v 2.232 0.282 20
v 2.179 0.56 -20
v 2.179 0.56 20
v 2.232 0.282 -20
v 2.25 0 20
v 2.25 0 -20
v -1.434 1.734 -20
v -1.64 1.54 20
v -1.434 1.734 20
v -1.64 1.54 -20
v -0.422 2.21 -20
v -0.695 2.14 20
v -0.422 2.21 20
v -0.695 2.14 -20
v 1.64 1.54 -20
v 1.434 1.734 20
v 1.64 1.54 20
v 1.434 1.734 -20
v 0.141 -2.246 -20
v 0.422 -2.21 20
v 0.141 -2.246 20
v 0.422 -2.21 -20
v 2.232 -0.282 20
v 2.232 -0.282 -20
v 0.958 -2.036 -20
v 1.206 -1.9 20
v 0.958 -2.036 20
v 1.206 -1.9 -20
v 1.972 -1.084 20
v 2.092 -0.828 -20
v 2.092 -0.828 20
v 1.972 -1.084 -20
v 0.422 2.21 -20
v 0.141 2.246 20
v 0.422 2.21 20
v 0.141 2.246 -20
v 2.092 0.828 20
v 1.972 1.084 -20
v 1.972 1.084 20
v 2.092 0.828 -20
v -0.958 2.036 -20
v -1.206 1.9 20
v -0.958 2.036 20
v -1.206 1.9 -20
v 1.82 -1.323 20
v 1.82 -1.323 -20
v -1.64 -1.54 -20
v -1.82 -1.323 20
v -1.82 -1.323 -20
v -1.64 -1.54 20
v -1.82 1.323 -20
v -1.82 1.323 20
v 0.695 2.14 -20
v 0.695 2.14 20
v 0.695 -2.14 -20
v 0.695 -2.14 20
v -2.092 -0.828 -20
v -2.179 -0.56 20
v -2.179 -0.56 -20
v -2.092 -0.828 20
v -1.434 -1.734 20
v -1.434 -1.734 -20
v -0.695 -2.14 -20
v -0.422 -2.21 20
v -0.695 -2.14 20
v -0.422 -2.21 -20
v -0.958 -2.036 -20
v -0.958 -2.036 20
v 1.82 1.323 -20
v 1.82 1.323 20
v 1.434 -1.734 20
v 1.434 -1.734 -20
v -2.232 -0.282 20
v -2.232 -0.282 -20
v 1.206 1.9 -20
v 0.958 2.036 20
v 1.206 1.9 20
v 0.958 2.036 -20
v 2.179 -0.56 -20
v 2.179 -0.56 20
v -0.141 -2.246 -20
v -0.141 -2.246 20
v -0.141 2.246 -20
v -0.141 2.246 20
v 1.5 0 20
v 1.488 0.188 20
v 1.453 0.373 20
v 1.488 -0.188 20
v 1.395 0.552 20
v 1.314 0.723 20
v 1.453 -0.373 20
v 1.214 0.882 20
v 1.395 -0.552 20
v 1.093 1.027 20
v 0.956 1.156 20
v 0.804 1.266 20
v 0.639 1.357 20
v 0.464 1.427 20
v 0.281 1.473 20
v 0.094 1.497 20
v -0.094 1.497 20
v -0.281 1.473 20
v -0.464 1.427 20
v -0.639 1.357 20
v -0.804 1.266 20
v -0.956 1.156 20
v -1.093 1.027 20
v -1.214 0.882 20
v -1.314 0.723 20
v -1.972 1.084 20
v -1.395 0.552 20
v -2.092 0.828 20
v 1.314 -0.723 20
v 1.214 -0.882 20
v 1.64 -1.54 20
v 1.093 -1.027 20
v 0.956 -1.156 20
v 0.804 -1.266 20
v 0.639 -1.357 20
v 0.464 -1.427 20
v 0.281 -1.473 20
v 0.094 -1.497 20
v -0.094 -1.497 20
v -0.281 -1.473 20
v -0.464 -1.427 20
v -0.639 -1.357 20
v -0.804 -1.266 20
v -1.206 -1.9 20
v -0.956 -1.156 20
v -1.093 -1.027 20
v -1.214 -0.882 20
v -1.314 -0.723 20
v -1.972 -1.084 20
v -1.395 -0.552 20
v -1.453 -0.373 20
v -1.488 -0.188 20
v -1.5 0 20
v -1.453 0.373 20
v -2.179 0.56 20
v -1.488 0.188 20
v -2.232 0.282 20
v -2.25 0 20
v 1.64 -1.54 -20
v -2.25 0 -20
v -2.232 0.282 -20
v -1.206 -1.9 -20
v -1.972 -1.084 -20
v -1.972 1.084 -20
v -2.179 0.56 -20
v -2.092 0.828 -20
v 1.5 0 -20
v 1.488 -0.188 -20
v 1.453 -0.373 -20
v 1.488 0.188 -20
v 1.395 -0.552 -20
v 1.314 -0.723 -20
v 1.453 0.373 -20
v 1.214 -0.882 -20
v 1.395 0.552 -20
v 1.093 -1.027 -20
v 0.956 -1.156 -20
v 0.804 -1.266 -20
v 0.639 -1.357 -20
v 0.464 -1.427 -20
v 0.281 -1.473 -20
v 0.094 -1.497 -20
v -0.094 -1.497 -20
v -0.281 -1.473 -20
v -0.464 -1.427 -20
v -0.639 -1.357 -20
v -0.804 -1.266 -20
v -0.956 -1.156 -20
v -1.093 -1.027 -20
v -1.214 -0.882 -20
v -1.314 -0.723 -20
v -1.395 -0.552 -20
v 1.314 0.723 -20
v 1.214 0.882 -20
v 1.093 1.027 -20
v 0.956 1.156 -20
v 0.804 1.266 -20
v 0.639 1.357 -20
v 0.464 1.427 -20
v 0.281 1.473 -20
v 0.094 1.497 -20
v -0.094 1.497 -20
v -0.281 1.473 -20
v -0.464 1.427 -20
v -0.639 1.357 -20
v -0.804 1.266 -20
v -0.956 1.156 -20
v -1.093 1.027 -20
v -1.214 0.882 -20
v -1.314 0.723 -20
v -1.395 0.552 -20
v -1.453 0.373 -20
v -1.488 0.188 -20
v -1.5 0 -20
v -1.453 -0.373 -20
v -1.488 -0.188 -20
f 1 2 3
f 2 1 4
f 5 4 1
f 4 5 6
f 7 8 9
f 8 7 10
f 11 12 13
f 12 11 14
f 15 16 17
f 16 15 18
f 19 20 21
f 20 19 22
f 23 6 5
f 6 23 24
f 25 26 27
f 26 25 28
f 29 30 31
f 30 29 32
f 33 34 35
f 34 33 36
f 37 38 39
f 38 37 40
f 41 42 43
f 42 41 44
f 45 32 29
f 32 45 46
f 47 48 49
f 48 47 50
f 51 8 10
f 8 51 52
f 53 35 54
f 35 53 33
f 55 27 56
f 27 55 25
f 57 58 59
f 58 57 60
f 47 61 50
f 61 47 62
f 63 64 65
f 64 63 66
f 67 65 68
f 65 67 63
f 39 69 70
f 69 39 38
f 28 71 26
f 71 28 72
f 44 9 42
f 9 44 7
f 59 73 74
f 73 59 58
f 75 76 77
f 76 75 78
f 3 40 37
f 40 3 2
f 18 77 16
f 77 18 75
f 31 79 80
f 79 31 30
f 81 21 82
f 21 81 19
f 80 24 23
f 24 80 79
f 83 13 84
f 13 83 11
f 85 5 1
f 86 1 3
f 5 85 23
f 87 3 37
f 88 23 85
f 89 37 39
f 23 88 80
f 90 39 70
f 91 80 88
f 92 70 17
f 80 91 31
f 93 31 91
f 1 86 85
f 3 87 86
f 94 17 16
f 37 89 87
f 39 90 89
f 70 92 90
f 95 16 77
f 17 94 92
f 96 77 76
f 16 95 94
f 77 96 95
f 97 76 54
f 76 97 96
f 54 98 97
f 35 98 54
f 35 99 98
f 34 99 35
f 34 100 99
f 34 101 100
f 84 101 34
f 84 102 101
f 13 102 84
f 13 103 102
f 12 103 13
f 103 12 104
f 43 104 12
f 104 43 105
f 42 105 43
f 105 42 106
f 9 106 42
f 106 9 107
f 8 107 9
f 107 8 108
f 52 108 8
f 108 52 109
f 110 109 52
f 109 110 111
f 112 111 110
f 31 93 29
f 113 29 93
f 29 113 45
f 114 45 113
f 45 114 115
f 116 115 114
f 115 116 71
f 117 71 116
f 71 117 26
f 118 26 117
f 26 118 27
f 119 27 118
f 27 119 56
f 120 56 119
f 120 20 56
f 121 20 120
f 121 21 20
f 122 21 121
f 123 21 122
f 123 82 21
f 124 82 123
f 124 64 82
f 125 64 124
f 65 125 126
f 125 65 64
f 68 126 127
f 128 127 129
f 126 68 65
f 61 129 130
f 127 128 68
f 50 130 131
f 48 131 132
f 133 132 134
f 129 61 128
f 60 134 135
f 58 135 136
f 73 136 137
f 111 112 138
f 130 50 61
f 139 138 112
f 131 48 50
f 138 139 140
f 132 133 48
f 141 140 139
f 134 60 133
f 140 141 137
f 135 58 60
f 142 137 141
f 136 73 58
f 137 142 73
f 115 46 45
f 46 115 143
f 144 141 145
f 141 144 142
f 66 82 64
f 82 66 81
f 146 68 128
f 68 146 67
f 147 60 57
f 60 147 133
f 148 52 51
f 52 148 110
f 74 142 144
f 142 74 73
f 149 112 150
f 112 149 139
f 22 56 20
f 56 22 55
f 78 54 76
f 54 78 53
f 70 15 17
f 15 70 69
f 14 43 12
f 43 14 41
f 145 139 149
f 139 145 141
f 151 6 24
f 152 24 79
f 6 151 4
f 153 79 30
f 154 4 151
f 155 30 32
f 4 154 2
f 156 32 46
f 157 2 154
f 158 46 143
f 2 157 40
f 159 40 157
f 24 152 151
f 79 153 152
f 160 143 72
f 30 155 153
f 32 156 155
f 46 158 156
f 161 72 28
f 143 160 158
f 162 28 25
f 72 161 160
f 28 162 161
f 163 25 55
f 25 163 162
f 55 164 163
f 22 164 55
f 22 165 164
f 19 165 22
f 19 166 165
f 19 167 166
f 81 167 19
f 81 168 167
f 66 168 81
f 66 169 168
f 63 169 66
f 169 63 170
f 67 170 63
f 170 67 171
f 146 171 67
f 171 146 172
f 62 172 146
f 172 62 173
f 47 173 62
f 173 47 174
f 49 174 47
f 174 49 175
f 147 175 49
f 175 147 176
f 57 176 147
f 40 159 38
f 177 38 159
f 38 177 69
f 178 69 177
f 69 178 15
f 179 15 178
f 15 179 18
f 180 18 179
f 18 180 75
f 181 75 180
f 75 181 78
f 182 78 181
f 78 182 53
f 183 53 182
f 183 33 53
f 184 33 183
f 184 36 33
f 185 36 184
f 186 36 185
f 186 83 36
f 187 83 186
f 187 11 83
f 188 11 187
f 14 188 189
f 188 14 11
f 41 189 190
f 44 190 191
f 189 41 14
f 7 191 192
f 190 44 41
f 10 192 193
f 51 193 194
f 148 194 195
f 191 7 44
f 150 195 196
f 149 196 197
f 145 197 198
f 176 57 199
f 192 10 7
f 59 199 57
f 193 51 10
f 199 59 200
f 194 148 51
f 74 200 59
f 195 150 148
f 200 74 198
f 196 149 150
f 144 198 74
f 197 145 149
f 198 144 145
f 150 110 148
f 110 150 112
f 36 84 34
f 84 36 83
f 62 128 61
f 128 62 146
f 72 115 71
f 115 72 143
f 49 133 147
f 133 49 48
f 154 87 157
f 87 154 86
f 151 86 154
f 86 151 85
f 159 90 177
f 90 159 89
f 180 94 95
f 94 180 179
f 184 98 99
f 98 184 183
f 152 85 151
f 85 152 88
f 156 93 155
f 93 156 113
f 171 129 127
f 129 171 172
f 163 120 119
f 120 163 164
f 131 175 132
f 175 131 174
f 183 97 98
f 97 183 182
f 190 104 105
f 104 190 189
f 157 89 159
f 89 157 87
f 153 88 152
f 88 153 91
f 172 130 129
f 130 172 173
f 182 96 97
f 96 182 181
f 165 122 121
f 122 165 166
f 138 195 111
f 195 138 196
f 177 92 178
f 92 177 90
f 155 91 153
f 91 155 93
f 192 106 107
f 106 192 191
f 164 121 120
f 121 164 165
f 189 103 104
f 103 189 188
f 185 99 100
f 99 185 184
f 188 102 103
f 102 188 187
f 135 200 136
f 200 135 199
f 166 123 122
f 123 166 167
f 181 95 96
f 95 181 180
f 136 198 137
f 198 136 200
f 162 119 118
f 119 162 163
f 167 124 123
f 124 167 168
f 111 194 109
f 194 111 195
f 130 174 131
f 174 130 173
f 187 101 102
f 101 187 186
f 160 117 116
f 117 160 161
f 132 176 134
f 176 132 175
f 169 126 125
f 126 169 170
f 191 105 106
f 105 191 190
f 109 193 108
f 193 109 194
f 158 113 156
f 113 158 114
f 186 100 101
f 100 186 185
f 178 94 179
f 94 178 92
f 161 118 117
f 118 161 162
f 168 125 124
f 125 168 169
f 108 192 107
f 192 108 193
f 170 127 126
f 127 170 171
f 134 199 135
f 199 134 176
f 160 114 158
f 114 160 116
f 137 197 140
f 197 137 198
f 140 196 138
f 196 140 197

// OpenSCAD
$fn = 50;


difference() {
	union() {
		translate(v = [0, 0, -20.0000000000]) {
			cylinder(h = 40, r = 2.2500000000);
		}
	}
	union() {
		translate(v = [0, 0, -100.0000000000]) {
			cylinder(h = 200, r = 1.5000000000);
		}
	}
}
